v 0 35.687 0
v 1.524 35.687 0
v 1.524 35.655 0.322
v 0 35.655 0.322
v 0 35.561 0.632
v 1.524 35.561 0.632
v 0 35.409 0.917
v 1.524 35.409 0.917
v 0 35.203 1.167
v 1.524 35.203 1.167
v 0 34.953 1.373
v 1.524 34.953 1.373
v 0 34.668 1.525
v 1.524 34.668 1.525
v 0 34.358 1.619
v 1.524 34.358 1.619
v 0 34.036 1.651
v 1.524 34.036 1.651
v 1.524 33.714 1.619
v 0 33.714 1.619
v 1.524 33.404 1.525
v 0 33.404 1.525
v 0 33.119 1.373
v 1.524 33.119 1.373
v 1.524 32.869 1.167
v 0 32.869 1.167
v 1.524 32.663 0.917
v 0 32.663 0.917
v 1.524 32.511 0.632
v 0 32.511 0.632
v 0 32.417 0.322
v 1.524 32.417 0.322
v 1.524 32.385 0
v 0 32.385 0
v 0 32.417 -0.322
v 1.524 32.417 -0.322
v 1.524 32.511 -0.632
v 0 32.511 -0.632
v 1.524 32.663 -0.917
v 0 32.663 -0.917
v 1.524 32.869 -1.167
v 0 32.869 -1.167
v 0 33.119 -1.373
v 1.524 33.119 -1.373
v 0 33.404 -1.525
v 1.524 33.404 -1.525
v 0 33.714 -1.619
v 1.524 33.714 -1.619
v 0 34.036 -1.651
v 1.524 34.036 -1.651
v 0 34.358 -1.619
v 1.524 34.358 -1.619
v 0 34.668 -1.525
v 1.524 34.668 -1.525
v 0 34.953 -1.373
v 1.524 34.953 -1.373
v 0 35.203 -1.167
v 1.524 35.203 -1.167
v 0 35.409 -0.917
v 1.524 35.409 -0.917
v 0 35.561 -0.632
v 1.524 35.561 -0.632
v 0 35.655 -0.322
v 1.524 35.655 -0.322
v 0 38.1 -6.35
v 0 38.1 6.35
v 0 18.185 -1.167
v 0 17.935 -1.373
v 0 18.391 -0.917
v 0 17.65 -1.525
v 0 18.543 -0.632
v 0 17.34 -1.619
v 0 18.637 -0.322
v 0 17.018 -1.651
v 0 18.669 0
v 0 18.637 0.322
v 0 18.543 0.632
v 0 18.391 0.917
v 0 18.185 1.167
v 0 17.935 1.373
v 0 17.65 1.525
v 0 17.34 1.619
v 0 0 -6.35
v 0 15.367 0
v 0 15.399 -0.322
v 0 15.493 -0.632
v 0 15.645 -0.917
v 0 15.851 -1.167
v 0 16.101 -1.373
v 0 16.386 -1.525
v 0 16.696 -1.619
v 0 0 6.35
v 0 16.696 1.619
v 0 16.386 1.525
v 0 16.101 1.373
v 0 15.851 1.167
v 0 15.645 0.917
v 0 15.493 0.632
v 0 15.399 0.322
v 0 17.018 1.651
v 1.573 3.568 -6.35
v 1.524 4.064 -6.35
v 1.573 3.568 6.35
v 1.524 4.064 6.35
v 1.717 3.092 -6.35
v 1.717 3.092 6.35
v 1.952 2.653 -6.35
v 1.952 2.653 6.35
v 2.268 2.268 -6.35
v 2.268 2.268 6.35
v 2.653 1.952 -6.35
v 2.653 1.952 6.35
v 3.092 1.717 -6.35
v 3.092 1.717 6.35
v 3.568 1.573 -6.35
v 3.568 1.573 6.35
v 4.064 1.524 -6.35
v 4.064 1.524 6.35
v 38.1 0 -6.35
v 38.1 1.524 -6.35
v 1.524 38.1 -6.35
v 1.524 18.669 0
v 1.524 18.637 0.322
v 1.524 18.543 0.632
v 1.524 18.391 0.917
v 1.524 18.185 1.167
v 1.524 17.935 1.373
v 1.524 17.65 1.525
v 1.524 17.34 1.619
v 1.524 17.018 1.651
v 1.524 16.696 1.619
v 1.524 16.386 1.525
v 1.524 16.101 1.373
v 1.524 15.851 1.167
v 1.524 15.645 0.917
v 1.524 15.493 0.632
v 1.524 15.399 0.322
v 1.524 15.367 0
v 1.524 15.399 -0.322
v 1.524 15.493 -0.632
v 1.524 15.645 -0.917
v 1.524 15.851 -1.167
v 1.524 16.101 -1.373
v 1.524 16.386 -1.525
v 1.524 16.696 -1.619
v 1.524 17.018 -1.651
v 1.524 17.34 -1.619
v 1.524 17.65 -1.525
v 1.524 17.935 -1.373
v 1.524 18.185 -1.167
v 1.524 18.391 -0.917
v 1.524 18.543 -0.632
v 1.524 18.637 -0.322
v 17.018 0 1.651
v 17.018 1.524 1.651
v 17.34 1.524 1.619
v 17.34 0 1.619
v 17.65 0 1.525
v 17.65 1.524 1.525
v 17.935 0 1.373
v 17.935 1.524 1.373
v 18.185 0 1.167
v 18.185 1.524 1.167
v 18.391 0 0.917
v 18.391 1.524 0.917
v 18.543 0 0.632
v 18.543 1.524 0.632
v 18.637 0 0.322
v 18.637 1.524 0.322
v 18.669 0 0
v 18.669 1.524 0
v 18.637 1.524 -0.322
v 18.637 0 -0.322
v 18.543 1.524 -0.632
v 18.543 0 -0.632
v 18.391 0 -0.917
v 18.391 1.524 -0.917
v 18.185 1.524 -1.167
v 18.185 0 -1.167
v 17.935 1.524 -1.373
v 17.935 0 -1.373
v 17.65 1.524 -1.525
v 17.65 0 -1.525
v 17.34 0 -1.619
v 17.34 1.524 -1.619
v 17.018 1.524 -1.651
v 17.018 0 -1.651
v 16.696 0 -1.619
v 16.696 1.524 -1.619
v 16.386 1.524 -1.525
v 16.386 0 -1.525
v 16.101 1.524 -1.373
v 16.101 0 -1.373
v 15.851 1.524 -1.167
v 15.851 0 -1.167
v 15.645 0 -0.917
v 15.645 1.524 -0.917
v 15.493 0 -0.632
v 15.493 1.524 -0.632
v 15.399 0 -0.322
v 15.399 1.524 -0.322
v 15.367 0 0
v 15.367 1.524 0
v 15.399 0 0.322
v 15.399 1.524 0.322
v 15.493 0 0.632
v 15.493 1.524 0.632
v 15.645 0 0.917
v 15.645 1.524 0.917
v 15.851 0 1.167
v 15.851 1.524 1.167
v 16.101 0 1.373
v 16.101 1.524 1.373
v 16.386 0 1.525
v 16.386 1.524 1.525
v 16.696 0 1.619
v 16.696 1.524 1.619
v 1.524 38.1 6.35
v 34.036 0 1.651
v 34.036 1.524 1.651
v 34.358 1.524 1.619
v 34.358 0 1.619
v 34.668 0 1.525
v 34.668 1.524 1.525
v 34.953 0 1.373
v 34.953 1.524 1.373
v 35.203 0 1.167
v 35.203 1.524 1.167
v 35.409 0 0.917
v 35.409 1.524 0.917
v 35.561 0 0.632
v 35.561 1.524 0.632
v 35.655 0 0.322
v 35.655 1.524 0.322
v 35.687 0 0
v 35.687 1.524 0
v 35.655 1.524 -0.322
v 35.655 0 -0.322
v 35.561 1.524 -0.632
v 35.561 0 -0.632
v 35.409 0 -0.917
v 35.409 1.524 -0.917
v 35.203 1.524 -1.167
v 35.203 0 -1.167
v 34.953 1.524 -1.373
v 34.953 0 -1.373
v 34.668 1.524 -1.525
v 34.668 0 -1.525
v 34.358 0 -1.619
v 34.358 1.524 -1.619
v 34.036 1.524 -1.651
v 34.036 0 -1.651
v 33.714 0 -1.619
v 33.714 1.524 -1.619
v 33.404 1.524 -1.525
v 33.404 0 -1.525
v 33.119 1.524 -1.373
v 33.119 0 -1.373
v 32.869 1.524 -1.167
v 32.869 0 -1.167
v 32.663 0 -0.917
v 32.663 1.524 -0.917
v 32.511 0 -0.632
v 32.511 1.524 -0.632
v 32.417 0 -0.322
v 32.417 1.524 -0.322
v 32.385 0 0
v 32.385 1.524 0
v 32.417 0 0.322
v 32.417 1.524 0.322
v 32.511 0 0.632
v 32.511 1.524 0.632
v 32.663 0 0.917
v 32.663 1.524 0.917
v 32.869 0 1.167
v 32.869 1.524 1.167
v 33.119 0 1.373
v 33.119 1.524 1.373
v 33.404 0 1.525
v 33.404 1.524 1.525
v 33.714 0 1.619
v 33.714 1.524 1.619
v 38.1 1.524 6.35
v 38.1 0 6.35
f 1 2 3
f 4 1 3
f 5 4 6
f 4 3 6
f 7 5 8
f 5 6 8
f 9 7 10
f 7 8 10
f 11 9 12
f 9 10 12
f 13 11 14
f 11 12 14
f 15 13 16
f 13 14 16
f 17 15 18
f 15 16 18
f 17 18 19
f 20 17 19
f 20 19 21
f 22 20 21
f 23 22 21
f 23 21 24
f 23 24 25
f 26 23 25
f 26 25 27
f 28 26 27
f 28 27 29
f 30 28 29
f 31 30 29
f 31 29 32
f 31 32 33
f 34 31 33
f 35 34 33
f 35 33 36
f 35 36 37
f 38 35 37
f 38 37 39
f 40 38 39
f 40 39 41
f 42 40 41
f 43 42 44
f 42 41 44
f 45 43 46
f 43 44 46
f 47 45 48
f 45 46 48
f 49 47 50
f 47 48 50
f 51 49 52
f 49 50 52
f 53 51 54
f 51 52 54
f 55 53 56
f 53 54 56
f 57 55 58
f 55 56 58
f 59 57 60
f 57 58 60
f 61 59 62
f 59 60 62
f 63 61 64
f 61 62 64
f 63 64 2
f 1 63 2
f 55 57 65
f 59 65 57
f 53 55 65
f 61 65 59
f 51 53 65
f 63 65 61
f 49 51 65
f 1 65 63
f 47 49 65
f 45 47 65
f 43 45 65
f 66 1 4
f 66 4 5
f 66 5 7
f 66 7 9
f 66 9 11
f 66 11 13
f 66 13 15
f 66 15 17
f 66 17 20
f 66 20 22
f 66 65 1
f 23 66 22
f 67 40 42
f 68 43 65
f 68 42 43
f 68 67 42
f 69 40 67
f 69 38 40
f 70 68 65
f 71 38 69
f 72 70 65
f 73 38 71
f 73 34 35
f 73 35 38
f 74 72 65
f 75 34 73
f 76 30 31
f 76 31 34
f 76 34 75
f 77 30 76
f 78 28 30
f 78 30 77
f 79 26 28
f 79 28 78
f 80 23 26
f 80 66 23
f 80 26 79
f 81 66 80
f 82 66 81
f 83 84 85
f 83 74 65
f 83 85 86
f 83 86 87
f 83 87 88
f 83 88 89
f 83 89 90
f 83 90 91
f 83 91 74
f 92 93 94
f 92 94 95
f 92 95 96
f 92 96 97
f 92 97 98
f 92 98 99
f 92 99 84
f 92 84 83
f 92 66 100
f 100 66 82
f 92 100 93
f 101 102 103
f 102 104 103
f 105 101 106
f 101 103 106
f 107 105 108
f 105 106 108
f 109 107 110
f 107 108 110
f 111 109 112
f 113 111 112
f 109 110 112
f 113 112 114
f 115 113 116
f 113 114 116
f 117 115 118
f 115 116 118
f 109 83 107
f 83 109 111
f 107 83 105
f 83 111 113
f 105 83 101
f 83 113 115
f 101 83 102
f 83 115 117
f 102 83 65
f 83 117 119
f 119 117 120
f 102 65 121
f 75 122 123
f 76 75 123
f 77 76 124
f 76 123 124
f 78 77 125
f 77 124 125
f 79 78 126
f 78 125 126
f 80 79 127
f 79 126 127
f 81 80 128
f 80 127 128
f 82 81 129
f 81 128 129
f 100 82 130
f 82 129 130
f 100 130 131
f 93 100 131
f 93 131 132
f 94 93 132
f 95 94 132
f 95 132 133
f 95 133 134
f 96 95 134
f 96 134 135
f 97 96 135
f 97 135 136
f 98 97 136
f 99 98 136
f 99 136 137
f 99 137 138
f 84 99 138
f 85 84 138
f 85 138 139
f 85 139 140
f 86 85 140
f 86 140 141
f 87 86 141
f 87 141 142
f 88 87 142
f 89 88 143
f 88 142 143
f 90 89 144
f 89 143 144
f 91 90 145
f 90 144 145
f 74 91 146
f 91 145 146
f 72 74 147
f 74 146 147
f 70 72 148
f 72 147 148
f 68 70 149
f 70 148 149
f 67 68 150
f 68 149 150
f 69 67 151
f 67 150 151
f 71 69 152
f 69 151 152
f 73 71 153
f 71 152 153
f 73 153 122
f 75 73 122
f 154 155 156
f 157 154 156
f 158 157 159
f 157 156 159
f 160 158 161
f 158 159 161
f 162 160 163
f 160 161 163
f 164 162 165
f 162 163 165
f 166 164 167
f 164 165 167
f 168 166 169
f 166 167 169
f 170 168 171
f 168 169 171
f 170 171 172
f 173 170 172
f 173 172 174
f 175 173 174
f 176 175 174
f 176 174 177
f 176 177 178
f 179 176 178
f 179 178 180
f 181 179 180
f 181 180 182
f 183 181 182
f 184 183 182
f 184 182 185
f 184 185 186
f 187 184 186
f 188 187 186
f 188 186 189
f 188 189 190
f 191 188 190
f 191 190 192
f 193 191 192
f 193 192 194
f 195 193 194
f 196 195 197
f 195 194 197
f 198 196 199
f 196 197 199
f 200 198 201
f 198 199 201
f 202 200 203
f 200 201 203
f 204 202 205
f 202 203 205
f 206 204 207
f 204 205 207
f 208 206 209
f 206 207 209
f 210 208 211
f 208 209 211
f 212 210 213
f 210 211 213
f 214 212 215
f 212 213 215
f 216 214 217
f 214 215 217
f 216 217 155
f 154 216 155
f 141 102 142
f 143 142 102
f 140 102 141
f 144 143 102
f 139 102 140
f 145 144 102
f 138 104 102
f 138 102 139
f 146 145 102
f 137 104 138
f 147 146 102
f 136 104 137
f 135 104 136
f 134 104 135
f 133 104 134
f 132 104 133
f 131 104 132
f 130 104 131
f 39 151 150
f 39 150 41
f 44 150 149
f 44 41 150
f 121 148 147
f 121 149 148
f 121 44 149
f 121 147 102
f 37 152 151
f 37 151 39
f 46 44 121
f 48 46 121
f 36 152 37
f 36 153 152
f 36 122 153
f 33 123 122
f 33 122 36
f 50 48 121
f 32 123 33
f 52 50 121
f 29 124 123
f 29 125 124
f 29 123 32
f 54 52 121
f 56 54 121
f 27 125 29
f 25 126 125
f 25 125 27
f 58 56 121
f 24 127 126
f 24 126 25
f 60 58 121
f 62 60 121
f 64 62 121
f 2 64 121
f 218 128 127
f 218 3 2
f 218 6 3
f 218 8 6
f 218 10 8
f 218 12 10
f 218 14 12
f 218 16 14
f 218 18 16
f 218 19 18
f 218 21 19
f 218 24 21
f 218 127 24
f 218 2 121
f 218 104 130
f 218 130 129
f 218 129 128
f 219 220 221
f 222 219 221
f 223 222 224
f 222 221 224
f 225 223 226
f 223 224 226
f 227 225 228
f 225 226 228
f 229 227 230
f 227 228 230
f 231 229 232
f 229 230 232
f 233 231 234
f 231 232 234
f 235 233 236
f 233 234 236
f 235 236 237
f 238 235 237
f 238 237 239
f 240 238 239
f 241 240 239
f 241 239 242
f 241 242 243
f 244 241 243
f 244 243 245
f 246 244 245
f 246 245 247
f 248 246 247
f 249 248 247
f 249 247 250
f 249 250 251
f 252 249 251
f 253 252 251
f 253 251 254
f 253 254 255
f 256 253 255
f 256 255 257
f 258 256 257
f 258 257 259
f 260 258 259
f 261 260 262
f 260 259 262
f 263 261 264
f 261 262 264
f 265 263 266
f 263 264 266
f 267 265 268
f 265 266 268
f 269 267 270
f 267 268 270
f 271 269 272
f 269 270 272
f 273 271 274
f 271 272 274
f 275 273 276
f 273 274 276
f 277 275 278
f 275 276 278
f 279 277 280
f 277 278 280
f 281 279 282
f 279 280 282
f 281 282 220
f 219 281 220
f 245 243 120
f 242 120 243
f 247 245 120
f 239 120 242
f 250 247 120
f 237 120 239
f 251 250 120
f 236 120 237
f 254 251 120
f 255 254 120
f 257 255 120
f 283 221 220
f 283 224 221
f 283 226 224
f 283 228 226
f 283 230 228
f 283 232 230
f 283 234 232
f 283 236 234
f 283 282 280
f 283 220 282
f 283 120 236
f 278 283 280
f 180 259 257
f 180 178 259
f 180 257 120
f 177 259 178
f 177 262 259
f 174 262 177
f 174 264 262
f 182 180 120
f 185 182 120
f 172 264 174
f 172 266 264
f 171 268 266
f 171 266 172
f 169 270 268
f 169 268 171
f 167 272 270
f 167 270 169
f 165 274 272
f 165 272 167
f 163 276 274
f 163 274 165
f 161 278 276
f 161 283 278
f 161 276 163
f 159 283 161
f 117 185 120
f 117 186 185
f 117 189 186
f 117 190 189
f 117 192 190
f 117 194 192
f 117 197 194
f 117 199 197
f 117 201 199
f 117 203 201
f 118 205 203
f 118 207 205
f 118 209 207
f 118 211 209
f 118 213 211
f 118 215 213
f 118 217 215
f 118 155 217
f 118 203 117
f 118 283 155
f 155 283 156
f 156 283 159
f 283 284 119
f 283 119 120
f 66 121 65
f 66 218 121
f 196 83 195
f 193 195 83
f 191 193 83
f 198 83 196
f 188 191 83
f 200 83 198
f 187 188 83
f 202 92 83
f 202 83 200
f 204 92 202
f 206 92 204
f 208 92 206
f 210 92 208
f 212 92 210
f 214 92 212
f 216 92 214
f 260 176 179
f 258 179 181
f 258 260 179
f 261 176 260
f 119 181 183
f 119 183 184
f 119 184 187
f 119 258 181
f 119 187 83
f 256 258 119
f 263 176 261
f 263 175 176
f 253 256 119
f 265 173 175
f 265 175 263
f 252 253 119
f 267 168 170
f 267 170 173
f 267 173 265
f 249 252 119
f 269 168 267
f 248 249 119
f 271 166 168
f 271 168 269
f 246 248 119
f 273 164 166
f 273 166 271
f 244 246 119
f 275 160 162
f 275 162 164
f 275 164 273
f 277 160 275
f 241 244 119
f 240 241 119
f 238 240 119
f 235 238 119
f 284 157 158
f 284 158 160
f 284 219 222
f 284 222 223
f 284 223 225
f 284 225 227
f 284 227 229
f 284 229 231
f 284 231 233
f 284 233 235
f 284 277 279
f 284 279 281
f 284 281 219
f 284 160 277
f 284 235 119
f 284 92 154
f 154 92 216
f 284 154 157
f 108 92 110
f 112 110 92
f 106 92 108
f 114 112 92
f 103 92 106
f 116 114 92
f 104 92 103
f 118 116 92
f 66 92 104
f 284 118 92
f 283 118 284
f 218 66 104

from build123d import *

# Parameters (mm, degrees)
BOSS_EXTRUDE1_DEPTH = 6.35
FILLET1_R           = 2.54
SKETCH2_R           = 1.651
CUT_EXTRUDE1_DEPTH  = 54.195265541
SKETCH3_R           = 1.651
CUT_EXTRUDE2_DEPTH  = 54.195265541


with BuildPart() as part:
    # Sketch1 → Boss-Extrude1 (new, symmetric)
    with BuildSketch(Plane.XY):
        Polygon((0, 0), (38.1, 0), (38.1, 1.524), (36.576, 1.524), (1.524, 1.524), (1.524, 36.576), (1.524, 38.1), (0, 38.1), align=None)
    extrude(amount=BOSS_EXTRUDE1_DEPTH, both=True)

    # Fillet1
    fillet1_edges = [part.edges().sort_by_distance(p)[0] for p in [
        (1.524, 1.524, 0),
    ]]
    fillet(fillet1_edges, radius=FILLET1_R)

    # Sketch2 → Cut-Extrude1 (cut, through all)
    with BuildSketch(Plane(origin=(1.524, 0, 0), x_dir=(0, 0, -1), z_dir=(1, 0, 0))):
        with Locations(Location((0, 34.036, 0), (0, 0, 90))):
            Circle(SKETCH2_R)
        with Locations(Location((0, 17.018, 0), (0, 0, 90))):
            Circle(SKETCH2_R)
    extrude(amount=-CUT_EXTRUDE1_DEPTH, mode=Mode.SUBTRACT)

    # Sketch3 → Cut-Extrude2 (cut, through all)
    with BuildSketch(Plane(origin=(0, 1.524, 0), x_dir=(1, 0, 0), z_dir=(0, 1, 0))):
        with Locations(Location((17.018, 0, 0), (0, 0, 270))):
            Circle(SKETCH3_R)
        with Locations(Location((34.036, 0, 0), (0, 0, 270))):
            Circle(SKETCH3_R)
    extrude(amount=-CUT_EXTRUDE2_DEPTH, mode=Mode.SUBTRACT)


solid = part.part
